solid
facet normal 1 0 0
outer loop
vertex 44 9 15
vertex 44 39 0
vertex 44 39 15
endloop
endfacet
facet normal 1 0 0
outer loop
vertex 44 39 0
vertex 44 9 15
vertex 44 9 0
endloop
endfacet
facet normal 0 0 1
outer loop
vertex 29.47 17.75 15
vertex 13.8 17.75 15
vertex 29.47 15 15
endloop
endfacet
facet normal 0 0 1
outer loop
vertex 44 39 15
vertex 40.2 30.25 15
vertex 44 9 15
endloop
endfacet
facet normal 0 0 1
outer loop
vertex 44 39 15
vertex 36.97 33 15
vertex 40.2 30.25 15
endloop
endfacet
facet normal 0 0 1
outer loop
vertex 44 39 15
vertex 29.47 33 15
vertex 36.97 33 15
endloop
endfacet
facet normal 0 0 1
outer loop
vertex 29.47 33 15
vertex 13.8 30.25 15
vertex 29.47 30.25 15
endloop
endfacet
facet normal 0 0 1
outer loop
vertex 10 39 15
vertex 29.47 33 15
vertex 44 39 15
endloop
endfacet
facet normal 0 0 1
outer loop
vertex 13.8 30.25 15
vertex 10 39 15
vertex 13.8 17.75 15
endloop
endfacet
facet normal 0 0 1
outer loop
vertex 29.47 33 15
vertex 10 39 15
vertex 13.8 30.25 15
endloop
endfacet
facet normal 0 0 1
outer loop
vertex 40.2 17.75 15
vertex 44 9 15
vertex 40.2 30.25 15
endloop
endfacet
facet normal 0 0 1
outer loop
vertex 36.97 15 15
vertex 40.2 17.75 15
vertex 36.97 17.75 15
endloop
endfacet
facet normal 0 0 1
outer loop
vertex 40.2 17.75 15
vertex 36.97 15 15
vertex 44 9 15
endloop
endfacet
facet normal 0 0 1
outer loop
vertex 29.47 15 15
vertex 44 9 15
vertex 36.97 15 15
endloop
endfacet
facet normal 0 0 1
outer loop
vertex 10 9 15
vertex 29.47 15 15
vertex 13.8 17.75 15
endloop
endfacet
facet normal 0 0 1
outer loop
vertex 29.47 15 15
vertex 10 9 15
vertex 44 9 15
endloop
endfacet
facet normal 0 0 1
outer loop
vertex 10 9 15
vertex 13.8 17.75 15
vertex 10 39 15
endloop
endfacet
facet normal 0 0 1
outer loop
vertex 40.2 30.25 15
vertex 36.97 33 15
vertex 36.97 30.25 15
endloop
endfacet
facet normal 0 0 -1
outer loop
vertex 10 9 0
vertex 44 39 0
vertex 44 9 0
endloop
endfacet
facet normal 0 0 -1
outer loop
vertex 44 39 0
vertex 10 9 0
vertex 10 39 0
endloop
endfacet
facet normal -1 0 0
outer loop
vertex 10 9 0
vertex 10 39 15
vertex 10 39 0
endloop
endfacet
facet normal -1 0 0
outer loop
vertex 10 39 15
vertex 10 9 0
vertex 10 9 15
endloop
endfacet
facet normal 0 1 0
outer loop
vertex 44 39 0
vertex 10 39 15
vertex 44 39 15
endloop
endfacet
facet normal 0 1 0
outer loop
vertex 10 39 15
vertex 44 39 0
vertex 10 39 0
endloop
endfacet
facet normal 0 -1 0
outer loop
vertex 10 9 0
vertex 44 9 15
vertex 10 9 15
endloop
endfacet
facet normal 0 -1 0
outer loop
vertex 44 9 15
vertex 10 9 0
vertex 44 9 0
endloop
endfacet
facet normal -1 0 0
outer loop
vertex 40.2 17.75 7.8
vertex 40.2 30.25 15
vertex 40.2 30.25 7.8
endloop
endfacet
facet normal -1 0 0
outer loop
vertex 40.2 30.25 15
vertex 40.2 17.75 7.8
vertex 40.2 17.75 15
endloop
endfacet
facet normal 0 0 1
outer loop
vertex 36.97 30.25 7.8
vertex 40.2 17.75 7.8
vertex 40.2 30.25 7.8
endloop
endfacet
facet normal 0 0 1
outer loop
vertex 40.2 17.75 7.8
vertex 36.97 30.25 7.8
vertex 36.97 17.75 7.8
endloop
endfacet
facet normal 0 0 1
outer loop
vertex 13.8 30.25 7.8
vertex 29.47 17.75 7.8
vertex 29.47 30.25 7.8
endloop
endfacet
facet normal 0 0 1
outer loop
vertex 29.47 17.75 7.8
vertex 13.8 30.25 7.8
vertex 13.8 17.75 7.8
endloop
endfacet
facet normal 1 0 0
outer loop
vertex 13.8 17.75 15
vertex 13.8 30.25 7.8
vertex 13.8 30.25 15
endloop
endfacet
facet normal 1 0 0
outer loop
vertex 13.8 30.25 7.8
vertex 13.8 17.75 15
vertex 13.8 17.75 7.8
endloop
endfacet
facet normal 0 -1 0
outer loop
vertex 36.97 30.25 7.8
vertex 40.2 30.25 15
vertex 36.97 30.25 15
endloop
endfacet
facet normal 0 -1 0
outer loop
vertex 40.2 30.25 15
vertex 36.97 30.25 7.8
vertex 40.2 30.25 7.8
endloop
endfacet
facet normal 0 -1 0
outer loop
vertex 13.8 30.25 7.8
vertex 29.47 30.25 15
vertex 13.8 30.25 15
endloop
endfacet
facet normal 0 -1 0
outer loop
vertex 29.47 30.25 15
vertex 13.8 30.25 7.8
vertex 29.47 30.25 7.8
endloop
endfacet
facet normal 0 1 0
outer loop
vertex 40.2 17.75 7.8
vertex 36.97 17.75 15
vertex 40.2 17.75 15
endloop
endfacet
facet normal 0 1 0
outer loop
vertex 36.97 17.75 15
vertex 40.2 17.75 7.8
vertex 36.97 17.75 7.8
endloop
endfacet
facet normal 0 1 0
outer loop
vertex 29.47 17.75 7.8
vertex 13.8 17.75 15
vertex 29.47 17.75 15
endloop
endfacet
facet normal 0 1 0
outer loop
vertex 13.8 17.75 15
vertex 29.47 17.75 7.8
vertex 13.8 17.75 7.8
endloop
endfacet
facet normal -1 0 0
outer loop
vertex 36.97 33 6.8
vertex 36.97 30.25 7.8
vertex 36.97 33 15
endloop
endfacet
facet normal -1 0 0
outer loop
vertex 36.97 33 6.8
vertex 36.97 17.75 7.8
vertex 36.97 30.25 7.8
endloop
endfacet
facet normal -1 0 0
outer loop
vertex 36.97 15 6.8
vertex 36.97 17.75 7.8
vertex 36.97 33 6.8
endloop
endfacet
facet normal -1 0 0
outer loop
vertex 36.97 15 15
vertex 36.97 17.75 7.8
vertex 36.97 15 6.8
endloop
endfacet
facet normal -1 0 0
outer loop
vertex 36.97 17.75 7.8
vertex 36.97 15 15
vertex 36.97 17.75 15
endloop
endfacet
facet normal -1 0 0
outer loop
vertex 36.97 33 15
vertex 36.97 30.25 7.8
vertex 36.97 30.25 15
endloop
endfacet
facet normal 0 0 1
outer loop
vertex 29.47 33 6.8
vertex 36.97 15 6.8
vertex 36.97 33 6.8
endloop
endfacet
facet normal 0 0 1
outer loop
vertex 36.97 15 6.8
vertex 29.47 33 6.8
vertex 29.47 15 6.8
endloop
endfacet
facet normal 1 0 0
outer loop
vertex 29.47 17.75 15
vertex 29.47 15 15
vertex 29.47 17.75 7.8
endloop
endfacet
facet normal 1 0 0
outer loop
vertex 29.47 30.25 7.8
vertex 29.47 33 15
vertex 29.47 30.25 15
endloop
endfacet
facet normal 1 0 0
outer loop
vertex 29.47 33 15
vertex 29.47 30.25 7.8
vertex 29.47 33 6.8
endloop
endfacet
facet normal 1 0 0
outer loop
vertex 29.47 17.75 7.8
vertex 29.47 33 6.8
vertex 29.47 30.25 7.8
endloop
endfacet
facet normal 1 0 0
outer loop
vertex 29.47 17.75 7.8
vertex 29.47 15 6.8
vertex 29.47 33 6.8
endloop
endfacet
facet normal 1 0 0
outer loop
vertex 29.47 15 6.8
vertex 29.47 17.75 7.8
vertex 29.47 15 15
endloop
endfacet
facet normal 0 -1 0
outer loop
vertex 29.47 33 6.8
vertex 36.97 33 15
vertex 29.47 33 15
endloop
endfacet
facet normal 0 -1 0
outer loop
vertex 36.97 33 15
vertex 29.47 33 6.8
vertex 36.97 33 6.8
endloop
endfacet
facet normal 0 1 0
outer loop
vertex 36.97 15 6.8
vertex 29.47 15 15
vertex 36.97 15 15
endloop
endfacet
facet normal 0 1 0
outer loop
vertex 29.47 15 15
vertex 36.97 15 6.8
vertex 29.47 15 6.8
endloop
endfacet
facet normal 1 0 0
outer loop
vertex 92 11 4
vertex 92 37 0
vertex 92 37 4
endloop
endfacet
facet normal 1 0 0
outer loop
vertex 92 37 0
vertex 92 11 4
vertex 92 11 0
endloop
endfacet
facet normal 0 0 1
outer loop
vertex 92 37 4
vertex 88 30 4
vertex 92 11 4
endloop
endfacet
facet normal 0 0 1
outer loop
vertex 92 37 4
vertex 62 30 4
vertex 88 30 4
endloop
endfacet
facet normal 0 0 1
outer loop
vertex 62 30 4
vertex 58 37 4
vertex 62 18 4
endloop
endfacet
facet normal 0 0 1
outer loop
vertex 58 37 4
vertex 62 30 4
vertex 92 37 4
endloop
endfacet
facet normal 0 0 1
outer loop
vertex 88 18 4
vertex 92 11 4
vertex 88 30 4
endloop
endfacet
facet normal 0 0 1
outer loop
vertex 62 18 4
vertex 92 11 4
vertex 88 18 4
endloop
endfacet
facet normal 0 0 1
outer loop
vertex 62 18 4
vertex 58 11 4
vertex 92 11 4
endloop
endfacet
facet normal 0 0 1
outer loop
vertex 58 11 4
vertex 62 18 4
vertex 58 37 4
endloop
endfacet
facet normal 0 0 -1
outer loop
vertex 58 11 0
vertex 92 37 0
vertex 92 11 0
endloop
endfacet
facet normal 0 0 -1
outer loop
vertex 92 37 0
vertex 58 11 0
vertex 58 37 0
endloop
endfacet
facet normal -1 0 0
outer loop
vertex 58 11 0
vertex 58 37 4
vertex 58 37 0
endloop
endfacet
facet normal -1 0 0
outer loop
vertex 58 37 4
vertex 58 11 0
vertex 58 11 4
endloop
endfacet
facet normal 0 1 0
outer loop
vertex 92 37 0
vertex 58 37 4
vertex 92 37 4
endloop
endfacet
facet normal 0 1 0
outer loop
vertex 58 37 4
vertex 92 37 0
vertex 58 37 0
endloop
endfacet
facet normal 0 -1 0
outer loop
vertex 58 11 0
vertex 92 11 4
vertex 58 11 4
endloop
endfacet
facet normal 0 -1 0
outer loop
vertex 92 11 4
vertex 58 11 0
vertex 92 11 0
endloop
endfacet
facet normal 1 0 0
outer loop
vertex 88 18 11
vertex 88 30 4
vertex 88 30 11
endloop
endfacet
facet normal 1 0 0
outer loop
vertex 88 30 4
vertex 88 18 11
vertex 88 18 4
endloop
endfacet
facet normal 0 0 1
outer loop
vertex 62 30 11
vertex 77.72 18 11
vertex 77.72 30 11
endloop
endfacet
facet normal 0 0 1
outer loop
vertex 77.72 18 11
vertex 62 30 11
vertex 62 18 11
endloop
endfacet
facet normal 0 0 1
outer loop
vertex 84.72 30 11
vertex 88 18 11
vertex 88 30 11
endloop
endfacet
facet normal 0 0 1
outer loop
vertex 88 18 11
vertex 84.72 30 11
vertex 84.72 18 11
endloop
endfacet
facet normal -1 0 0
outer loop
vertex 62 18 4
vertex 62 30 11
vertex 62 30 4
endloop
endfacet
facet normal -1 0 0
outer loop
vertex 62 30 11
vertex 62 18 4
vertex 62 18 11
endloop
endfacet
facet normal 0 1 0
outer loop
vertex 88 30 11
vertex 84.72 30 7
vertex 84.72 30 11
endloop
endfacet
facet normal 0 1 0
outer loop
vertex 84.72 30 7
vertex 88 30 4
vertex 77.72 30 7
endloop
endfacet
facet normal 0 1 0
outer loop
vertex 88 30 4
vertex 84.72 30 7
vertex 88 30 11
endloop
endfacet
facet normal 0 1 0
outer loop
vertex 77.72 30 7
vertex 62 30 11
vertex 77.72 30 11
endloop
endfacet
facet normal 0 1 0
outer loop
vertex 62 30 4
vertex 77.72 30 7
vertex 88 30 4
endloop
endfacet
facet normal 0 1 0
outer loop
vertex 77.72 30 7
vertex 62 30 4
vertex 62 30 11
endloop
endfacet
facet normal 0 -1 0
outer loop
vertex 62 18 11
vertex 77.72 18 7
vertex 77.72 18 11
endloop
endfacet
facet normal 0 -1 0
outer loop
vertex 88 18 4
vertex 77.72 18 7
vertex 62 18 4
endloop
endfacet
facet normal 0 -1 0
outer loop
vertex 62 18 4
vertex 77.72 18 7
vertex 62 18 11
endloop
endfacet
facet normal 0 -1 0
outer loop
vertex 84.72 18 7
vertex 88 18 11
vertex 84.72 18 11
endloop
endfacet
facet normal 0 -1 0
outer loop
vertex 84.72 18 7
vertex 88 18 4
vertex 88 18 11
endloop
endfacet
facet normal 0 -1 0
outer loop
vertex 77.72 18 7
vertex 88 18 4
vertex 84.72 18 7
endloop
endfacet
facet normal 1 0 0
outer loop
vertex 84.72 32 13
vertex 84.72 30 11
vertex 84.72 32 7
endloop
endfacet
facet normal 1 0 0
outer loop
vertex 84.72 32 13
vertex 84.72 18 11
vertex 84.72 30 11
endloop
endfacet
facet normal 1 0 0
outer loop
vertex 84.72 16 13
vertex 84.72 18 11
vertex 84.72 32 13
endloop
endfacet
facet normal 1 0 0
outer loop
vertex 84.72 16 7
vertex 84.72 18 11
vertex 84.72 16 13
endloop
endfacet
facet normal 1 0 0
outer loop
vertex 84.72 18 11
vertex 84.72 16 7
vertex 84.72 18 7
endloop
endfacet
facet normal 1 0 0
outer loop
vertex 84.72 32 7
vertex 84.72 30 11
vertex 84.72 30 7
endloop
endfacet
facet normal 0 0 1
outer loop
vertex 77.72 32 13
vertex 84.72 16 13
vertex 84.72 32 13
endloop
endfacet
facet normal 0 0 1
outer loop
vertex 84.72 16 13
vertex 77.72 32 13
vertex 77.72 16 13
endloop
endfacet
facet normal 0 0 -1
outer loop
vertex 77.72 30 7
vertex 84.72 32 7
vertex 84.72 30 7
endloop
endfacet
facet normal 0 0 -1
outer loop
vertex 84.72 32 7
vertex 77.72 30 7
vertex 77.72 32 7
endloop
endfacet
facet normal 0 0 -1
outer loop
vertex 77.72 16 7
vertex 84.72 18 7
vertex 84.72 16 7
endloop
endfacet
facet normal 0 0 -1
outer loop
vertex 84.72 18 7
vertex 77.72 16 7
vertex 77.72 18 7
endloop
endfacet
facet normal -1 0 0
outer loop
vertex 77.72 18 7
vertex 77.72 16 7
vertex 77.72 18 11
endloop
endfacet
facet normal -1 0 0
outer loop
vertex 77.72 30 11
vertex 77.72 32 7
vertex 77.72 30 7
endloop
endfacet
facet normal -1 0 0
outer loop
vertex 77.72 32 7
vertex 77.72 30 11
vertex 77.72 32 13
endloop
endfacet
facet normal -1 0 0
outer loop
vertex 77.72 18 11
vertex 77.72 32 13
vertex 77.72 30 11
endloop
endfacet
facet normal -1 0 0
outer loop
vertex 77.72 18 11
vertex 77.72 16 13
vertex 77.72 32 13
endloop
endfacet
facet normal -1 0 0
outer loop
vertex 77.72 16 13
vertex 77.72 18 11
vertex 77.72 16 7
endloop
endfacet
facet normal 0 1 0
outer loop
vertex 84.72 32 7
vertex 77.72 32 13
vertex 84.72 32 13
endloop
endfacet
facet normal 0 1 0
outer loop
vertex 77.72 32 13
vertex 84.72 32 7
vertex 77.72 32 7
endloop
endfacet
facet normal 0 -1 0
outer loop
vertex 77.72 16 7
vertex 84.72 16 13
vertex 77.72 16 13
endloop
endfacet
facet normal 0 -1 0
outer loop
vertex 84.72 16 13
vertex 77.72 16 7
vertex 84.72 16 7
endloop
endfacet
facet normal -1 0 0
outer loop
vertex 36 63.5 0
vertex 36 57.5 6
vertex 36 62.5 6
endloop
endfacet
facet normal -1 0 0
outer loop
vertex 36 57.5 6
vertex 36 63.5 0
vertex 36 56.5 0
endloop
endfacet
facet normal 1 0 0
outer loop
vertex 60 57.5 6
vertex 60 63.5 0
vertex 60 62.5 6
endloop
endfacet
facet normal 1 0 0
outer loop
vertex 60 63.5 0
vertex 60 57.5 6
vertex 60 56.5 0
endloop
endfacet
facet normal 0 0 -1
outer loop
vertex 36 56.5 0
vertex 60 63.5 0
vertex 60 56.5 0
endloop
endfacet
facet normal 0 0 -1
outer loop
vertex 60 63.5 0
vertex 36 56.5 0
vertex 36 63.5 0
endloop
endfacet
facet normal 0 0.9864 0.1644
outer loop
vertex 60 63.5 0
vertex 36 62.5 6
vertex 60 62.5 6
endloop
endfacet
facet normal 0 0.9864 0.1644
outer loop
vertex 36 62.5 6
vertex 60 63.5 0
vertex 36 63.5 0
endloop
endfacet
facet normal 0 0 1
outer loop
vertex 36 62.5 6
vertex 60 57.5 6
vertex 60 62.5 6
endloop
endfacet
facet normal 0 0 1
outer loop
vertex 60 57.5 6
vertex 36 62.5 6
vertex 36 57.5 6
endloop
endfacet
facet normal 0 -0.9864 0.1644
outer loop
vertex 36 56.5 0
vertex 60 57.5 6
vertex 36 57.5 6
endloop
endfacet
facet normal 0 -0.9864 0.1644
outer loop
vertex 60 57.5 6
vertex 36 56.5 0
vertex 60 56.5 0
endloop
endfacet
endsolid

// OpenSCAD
/*
Sample 054: Nut-Feder-Verbindung mit Querkeil — 0,25 mm
Generated from the FDM Mechanical Sample Library.
Units: millimetres.

Override examples:
  openscad -o custom.stl -D 'view="plate"' -D 'render_fn=64' model.scad
  openscad -o preview.png -D 'view="assembly"' model.scad
*/
use <../../../library/fdm_mechanisms.scad>

render_fn = is_undef(render_fn) ? 48 : render_fn;
view = is_undef(view) ? "plate" : view;
$fn = render_fn;

sample_wedge_lock_joint(
    view=view,
    clearance=0.25
);
